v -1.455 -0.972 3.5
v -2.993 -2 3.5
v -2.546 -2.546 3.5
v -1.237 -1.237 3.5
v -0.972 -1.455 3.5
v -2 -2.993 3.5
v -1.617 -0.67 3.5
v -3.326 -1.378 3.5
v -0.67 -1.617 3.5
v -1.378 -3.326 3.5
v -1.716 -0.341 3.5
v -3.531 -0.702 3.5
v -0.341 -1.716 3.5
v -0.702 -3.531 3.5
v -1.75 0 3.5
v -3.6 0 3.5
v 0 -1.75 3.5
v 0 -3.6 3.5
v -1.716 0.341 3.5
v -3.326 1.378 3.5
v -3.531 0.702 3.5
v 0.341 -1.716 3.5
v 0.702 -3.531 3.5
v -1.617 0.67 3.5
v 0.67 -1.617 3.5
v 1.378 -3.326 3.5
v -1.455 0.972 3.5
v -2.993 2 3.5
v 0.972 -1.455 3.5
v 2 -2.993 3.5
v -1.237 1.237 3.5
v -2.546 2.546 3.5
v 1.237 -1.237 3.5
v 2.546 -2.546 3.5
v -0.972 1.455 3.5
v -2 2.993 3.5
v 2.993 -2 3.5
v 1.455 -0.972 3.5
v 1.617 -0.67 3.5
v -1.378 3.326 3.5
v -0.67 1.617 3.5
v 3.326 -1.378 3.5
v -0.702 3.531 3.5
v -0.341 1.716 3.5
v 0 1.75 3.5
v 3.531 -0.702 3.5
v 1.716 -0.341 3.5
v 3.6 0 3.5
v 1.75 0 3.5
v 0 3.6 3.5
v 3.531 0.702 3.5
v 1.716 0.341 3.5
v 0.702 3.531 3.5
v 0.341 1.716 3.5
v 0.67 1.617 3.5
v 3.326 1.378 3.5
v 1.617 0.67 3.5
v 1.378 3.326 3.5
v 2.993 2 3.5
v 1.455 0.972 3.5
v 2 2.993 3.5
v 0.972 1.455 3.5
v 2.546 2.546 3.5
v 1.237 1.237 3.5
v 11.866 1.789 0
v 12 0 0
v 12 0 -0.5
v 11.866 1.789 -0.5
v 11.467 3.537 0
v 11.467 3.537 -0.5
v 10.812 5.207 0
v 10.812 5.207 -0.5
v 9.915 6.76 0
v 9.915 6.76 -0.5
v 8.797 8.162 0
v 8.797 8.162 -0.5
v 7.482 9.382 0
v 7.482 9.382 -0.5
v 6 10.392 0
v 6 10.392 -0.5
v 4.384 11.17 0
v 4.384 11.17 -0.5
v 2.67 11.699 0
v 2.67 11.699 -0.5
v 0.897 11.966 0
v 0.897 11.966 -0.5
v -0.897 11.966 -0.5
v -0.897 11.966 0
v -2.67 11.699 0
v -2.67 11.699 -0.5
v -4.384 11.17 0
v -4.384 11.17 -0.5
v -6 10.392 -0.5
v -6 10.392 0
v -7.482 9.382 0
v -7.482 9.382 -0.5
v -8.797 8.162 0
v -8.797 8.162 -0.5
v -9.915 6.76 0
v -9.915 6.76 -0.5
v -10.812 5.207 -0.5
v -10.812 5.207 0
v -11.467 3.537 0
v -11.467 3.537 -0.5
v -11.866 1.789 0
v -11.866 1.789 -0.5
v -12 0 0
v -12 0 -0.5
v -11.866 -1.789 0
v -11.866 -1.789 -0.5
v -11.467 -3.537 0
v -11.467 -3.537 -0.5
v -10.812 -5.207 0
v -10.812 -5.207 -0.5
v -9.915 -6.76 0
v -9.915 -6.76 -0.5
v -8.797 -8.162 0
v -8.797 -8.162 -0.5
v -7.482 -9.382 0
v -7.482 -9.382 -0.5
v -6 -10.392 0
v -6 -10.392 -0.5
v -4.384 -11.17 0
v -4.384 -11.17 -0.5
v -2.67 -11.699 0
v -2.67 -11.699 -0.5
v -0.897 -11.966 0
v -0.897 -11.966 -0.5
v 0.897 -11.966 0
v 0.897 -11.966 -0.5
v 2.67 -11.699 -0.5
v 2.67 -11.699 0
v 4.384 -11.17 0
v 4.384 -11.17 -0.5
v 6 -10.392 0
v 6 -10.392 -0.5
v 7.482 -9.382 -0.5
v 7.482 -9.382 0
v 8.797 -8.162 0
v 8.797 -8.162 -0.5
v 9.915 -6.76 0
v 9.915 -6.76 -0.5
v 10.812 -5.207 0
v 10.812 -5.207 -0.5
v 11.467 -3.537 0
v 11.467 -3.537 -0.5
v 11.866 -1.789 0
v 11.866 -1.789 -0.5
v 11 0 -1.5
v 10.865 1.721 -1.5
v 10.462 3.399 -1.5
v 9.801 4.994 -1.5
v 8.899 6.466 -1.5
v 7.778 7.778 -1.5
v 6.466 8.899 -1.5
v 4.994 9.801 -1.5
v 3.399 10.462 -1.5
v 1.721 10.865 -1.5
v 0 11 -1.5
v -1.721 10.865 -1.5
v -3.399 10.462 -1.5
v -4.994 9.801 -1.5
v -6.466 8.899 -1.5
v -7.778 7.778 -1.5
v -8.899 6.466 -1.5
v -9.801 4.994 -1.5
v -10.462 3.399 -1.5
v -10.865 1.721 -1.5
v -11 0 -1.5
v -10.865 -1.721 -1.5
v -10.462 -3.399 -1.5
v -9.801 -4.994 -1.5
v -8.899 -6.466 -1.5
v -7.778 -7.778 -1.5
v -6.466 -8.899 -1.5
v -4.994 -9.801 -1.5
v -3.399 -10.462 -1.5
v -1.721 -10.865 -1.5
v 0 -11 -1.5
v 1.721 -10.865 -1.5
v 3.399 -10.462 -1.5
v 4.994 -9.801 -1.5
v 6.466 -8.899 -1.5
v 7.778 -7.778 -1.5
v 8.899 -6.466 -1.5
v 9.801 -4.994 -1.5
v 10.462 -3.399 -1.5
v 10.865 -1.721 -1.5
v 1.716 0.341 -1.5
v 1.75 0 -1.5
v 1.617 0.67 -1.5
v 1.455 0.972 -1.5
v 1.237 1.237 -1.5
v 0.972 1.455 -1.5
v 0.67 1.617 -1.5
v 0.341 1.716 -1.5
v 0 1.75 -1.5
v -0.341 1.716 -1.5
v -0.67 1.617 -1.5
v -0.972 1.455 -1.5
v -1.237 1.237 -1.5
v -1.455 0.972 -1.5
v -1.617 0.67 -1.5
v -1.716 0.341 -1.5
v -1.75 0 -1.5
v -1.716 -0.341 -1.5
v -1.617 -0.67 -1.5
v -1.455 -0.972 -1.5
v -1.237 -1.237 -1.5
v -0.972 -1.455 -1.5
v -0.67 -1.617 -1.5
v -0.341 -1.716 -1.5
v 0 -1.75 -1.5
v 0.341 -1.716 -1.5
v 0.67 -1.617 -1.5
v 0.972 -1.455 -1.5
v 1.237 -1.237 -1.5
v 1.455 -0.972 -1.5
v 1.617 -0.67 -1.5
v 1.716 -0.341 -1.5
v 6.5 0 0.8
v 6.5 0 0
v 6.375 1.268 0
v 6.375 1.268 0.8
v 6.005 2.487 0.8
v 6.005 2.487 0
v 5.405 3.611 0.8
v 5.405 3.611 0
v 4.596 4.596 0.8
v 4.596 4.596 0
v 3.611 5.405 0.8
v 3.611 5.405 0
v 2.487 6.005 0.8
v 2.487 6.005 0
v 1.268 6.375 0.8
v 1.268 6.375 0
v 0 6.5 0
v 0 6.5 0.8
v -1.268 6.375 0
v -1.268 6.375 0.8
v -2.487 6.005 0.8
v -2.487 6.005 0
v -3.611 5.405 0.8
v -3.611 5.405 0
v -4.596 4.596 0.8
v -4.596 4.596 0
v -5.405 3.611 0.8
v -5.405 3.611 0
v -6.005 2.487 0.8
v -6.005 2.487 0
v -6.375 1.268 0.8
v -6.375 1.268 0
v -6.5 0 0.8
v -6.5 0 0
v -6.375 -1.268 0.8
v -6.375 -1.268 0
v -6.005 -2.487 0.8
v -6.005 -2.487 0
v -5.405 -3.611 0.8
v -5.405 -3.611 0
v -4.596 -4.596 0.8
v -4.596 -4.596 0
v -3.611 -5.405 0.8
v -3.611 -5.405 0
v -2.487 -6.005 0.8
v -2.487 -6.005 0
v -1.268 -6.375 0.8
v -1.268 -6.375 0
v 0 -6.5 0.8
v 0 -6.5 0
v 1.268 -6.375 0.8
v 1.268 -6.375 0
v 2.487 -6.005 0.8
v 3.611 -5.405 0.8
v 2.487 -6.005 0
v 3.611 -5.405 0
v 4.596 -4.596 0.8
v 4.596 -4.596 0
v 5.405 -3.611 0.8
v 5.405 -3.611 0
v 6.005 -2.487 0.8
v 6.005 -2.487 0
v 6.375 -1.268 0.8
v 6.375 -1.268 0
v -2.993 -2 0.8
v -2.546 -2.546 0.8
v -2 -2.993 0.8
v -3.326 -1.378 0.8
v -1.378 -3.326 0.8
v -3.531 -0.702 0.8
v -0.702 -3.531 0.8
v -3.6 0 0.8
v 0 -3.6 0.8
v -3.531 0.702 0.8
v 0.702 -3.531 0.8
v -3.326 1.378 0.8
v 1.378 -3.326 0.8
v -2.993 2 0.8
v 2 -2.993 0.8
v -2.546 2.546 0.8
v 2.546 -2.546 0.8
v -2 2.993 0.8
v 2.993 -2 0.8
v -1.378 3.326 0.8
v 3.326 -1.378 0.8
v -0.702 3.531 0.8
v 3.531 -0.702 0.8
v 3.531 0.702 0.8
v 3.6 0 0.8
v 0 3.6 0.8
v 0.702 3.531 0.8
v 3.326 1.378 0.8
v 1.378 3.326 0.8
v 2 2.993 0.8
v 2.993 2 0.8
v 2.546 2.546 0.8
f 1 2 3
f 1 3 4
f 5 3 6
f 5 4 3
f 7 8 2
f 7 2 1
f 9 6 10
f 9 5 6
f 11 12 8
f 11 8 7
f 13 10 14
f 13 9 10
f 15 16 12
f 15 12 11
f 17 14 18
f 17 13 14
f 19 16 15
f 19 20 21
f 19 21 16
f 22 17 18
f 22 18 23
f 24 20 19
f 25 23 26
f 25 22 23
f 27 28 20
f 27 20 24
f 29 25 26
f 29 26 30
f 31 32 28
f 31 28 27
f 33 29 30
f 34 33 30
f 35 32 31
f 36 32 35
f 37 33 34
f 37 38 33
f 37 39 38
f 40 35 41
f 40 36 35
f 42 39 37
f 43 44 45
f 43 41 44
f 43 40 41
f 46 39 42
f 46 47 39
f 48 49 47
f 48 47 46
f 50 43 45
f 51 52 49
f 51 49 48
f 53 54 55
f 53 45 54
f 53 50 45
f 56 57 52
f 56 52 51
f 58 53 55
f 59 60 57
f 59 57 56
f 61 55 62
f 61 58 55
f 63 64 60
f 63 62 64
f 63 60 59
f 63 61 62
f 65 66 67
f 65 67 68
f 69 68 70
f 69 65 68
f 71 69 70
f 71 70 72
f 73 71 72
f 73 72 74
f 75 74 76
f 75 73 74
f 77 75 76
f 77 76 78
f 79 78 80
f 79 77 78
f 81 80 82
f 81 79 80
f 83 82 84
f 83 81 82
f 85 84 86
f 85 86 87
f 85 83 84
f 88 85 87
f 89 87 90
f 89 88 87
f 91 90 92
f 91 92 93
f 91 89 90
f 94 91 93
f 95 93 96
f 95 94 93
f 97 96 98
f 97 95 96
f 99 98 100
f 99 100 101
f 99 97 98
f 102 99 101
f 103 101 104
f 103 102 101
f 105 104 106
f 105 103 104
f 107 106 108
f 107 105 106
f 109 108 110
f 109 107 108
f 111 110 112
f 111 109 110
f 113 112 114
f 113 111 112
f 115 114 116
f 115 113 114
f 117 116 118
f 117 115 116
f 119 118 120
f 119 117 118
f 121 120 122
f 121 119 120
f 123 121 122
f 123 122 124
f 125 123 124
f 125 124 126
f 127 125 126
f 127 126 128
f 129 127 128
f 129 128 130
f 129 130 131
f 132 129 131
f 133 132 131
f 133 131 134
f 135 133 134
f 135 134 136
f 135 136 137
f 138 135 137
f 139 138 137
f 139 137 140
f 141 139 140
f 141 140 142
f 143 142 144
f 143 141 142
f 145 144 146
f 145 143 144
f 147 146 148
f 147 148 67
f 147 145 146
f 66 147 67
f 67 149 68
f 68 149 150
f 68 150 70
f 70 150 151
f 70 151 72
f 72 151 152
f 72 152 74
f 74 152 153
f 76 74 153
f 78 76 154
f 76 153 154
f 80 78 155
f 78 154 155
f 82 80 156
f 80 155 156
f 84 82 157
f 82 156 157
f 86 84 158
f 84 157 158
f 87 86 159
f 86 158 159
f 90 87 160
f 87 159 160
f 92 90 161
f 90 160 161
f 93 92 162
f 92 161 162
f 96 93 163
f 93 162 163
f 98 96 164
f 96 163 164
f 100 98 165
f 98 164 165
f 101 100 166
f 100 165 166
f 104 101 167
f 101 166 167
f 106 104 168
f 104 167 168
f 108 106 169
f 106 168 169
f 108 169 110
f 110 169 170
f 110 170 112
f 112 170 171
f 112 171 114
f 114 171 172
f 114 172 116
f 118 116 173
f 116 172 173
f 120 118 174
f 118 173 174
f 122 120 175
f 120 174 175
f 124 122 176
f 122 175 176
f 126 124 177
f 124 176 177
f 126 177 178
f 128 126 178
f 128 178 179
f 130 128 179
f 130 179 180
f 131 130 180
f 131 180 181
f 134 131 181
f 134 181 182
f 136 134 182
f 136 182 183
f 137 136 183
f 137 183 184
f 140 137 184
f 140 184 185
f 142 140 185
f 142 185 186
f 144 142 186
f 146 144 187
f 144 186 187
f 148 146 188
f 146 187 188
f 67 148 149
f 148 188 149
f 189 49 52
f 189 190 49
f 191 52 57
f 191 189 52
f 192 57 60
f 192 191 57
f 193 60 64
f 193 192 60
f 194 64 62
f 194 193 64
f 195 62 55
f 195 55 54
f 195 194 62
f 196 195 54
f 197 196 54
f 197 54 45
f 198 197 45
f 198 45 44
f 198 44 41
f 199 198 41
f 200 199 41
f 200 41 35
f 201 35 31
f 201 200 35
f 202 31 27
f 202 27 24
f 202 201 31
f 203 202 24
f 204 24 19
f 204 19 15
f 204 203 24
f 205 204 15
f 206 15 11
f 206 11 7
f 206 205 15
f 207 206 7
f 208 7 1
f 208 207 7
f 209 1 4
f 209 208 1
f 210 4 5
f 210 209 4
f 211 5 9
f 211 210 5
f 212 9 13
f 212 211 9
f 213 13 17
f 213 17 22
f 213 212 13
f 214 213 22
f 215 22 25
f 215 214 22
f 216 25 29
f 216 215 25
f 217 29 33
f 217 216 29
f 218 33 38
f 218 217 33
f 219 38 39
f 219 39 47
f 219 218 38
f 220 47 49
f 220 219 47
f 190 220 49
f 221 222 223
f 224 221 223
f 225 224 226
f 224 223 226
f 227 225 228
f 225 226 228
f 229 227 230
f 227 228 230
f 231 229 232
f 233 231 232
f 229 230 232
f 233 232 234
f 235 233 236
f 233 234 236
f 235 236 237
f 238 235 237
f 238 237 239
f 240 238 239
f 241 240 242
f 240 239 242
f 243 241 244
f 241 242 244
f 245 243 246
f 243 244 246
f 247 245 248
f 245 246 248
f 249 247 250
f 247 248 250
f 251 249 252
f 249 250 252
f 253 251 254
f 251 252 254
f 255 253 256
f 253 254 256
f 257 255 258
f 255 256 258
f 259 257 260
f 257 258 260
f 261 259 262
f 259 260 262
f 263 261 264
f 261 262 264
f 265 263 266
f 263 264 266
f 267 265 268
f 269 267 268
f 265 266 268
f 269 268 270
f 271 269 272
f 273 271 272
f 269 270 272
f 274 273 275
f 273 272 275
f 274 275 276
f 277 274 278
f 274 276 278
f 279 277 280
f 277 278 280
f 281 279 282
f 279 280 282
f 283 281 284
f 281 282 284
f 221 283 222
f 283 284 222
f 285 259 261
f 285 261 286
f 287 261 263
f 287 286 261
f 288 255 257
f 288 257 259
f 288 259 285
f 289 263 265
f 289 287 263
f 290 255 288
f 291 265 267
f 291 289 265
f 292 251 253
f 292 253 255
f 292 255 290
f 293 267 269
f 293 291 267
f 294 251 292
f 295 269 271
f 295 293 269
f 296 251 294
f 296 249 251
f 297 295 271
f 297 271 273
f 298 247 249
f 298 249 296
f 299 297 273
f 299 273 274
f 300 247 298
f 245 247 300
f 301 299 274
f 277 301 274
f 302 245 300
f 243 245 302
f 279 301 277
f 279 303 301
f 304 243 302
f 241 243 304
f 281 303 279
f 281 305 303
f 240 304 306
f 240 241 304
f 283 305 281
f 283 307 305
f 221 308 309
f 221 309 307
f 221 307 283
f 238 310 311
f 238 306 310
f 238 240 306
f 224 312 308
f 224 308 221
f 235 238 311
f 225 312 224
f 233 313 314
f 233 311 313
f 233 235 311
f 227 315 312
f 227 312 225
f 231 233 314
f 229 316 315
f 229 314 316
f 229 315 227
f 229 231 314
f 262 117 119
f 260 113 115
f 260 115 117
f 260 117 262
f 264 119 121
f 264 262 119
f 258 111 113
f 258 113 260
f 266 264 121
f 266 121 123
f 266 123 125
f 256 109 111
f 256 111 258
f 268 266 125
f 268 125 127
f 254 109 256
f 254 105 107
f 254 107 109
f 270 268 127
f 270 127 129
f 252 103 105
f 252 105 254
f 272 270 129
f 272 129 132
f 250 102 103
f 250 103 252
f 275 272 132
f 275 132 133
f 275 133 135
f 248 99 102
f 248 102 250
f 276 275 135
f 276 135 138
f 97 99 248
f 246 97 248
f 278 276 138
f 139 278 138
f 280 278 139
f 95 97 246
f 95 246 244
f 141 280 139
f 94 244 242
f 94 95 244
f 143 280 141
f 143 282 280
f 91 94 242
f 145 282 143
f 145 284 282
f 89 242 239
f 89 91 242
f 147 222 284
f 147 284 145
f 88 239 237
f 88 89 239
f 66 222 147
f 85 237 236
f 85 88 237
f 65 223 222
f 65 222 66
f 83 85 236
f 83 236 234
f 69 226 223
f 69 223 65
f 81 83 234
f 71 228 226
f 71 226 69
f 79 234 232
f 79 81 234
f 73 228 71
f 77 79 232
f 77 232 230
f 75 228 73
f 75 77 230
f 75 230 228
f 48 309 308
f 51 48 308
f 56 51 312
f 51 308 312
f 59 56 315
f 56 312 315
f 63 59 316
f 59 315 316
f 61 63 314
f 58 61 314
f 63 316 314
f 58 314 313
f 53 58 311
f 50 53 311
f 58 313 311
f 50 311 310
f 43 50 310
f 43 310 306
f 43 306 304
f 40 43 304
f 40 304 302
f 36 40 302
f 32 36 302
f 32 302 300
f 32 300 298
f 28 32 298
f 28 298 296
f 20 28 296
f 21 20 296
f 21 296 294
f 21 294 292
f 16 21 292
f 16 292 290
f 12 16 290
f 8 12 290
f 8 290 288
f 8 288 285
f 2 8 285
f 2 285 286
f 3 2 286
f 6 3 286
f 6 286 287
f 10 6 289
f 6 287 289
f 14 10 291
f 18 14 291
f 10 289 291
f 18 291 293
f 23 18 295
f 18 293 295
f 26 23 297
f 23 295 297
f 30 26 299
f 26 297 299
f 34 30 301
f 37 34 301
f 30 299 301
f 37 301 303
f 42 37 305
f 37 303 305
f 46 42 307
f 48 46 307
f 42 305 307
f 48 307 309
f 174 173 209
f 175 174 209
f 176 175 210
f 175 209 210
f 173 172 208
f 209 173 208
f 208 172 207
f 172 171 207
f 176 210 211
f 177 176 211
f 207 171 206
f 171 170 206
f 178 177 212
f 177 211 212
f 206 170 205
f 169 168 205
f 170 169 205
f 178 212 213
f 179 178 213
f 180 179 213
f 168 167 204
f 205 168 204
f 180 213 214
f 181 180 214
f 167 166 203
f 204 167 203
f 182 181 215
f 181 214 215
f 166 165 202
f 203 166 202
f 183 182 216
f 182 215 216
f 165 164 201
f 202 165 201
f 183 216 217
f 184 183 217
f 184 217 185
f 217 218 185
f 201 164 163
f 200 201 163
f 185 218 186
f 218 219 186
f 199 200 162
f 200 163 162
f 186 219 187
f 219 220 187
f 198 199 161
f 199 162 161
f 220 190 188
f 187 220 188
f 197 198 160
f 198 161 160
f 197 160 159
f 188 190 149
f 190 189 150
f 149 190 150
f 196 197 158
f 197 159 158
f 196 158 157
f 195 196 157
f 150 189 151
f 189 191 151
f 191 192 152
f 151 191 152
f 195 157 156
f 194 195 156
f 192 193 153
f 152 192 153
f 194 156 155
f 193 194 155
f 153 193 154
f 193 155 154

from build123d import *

# Parameters (mm, degrees)
F0_R     = 12
F0_R_2   = 6.5
F0_R_3   = 3.6
F0_R_4   = 1.75
F1_DEPTH = 1.5
F2_DEPTH = 3.5
F3_DEPTH = 0.8
F4_SIZE  = 1


with BuildPart() as f1:
    # F0 (on Top) → F1 (new body)
    with BuildSketch(Plane.XY):
        Circle(F0_R)
        Circle(F0_R_2, mode=Mode.SUBTRACT)
        Circle(F0_R_2)
        Circle(F0_R_3, mode=Mode.SUBTRACT)
        Circle(F0_R_3)
        Circle(F0_R_4, mode=Mode.SUBTRACT)
    extrude(amount=-F1_DEPTH)

    # F0 (on Top) → F2 (join)
    with BuildSketch(Plane.XY):
        Circle(F0_R_3)
        Circle(F0_R_4, mode=Mode.SUBTRACT)
    extrude(amount=F2_DEPTH)

    # F0 (on Top) → F3 (join)
    with BuildSketch(Plane.XY):
        Circle(F0_R_2)
        Circle(F0_R_3, mode=Mode.SUBTRACT)
    extrude(amount=F3_DEPTH)

    # F4
    f4_edges = [f1.edges().sort_by_distance(p)[0] for p in [
        (-12, 0, -1.5),
    ]]
    chamfer(f4_edges, length=F4_SIZE)


solid = f1.part
